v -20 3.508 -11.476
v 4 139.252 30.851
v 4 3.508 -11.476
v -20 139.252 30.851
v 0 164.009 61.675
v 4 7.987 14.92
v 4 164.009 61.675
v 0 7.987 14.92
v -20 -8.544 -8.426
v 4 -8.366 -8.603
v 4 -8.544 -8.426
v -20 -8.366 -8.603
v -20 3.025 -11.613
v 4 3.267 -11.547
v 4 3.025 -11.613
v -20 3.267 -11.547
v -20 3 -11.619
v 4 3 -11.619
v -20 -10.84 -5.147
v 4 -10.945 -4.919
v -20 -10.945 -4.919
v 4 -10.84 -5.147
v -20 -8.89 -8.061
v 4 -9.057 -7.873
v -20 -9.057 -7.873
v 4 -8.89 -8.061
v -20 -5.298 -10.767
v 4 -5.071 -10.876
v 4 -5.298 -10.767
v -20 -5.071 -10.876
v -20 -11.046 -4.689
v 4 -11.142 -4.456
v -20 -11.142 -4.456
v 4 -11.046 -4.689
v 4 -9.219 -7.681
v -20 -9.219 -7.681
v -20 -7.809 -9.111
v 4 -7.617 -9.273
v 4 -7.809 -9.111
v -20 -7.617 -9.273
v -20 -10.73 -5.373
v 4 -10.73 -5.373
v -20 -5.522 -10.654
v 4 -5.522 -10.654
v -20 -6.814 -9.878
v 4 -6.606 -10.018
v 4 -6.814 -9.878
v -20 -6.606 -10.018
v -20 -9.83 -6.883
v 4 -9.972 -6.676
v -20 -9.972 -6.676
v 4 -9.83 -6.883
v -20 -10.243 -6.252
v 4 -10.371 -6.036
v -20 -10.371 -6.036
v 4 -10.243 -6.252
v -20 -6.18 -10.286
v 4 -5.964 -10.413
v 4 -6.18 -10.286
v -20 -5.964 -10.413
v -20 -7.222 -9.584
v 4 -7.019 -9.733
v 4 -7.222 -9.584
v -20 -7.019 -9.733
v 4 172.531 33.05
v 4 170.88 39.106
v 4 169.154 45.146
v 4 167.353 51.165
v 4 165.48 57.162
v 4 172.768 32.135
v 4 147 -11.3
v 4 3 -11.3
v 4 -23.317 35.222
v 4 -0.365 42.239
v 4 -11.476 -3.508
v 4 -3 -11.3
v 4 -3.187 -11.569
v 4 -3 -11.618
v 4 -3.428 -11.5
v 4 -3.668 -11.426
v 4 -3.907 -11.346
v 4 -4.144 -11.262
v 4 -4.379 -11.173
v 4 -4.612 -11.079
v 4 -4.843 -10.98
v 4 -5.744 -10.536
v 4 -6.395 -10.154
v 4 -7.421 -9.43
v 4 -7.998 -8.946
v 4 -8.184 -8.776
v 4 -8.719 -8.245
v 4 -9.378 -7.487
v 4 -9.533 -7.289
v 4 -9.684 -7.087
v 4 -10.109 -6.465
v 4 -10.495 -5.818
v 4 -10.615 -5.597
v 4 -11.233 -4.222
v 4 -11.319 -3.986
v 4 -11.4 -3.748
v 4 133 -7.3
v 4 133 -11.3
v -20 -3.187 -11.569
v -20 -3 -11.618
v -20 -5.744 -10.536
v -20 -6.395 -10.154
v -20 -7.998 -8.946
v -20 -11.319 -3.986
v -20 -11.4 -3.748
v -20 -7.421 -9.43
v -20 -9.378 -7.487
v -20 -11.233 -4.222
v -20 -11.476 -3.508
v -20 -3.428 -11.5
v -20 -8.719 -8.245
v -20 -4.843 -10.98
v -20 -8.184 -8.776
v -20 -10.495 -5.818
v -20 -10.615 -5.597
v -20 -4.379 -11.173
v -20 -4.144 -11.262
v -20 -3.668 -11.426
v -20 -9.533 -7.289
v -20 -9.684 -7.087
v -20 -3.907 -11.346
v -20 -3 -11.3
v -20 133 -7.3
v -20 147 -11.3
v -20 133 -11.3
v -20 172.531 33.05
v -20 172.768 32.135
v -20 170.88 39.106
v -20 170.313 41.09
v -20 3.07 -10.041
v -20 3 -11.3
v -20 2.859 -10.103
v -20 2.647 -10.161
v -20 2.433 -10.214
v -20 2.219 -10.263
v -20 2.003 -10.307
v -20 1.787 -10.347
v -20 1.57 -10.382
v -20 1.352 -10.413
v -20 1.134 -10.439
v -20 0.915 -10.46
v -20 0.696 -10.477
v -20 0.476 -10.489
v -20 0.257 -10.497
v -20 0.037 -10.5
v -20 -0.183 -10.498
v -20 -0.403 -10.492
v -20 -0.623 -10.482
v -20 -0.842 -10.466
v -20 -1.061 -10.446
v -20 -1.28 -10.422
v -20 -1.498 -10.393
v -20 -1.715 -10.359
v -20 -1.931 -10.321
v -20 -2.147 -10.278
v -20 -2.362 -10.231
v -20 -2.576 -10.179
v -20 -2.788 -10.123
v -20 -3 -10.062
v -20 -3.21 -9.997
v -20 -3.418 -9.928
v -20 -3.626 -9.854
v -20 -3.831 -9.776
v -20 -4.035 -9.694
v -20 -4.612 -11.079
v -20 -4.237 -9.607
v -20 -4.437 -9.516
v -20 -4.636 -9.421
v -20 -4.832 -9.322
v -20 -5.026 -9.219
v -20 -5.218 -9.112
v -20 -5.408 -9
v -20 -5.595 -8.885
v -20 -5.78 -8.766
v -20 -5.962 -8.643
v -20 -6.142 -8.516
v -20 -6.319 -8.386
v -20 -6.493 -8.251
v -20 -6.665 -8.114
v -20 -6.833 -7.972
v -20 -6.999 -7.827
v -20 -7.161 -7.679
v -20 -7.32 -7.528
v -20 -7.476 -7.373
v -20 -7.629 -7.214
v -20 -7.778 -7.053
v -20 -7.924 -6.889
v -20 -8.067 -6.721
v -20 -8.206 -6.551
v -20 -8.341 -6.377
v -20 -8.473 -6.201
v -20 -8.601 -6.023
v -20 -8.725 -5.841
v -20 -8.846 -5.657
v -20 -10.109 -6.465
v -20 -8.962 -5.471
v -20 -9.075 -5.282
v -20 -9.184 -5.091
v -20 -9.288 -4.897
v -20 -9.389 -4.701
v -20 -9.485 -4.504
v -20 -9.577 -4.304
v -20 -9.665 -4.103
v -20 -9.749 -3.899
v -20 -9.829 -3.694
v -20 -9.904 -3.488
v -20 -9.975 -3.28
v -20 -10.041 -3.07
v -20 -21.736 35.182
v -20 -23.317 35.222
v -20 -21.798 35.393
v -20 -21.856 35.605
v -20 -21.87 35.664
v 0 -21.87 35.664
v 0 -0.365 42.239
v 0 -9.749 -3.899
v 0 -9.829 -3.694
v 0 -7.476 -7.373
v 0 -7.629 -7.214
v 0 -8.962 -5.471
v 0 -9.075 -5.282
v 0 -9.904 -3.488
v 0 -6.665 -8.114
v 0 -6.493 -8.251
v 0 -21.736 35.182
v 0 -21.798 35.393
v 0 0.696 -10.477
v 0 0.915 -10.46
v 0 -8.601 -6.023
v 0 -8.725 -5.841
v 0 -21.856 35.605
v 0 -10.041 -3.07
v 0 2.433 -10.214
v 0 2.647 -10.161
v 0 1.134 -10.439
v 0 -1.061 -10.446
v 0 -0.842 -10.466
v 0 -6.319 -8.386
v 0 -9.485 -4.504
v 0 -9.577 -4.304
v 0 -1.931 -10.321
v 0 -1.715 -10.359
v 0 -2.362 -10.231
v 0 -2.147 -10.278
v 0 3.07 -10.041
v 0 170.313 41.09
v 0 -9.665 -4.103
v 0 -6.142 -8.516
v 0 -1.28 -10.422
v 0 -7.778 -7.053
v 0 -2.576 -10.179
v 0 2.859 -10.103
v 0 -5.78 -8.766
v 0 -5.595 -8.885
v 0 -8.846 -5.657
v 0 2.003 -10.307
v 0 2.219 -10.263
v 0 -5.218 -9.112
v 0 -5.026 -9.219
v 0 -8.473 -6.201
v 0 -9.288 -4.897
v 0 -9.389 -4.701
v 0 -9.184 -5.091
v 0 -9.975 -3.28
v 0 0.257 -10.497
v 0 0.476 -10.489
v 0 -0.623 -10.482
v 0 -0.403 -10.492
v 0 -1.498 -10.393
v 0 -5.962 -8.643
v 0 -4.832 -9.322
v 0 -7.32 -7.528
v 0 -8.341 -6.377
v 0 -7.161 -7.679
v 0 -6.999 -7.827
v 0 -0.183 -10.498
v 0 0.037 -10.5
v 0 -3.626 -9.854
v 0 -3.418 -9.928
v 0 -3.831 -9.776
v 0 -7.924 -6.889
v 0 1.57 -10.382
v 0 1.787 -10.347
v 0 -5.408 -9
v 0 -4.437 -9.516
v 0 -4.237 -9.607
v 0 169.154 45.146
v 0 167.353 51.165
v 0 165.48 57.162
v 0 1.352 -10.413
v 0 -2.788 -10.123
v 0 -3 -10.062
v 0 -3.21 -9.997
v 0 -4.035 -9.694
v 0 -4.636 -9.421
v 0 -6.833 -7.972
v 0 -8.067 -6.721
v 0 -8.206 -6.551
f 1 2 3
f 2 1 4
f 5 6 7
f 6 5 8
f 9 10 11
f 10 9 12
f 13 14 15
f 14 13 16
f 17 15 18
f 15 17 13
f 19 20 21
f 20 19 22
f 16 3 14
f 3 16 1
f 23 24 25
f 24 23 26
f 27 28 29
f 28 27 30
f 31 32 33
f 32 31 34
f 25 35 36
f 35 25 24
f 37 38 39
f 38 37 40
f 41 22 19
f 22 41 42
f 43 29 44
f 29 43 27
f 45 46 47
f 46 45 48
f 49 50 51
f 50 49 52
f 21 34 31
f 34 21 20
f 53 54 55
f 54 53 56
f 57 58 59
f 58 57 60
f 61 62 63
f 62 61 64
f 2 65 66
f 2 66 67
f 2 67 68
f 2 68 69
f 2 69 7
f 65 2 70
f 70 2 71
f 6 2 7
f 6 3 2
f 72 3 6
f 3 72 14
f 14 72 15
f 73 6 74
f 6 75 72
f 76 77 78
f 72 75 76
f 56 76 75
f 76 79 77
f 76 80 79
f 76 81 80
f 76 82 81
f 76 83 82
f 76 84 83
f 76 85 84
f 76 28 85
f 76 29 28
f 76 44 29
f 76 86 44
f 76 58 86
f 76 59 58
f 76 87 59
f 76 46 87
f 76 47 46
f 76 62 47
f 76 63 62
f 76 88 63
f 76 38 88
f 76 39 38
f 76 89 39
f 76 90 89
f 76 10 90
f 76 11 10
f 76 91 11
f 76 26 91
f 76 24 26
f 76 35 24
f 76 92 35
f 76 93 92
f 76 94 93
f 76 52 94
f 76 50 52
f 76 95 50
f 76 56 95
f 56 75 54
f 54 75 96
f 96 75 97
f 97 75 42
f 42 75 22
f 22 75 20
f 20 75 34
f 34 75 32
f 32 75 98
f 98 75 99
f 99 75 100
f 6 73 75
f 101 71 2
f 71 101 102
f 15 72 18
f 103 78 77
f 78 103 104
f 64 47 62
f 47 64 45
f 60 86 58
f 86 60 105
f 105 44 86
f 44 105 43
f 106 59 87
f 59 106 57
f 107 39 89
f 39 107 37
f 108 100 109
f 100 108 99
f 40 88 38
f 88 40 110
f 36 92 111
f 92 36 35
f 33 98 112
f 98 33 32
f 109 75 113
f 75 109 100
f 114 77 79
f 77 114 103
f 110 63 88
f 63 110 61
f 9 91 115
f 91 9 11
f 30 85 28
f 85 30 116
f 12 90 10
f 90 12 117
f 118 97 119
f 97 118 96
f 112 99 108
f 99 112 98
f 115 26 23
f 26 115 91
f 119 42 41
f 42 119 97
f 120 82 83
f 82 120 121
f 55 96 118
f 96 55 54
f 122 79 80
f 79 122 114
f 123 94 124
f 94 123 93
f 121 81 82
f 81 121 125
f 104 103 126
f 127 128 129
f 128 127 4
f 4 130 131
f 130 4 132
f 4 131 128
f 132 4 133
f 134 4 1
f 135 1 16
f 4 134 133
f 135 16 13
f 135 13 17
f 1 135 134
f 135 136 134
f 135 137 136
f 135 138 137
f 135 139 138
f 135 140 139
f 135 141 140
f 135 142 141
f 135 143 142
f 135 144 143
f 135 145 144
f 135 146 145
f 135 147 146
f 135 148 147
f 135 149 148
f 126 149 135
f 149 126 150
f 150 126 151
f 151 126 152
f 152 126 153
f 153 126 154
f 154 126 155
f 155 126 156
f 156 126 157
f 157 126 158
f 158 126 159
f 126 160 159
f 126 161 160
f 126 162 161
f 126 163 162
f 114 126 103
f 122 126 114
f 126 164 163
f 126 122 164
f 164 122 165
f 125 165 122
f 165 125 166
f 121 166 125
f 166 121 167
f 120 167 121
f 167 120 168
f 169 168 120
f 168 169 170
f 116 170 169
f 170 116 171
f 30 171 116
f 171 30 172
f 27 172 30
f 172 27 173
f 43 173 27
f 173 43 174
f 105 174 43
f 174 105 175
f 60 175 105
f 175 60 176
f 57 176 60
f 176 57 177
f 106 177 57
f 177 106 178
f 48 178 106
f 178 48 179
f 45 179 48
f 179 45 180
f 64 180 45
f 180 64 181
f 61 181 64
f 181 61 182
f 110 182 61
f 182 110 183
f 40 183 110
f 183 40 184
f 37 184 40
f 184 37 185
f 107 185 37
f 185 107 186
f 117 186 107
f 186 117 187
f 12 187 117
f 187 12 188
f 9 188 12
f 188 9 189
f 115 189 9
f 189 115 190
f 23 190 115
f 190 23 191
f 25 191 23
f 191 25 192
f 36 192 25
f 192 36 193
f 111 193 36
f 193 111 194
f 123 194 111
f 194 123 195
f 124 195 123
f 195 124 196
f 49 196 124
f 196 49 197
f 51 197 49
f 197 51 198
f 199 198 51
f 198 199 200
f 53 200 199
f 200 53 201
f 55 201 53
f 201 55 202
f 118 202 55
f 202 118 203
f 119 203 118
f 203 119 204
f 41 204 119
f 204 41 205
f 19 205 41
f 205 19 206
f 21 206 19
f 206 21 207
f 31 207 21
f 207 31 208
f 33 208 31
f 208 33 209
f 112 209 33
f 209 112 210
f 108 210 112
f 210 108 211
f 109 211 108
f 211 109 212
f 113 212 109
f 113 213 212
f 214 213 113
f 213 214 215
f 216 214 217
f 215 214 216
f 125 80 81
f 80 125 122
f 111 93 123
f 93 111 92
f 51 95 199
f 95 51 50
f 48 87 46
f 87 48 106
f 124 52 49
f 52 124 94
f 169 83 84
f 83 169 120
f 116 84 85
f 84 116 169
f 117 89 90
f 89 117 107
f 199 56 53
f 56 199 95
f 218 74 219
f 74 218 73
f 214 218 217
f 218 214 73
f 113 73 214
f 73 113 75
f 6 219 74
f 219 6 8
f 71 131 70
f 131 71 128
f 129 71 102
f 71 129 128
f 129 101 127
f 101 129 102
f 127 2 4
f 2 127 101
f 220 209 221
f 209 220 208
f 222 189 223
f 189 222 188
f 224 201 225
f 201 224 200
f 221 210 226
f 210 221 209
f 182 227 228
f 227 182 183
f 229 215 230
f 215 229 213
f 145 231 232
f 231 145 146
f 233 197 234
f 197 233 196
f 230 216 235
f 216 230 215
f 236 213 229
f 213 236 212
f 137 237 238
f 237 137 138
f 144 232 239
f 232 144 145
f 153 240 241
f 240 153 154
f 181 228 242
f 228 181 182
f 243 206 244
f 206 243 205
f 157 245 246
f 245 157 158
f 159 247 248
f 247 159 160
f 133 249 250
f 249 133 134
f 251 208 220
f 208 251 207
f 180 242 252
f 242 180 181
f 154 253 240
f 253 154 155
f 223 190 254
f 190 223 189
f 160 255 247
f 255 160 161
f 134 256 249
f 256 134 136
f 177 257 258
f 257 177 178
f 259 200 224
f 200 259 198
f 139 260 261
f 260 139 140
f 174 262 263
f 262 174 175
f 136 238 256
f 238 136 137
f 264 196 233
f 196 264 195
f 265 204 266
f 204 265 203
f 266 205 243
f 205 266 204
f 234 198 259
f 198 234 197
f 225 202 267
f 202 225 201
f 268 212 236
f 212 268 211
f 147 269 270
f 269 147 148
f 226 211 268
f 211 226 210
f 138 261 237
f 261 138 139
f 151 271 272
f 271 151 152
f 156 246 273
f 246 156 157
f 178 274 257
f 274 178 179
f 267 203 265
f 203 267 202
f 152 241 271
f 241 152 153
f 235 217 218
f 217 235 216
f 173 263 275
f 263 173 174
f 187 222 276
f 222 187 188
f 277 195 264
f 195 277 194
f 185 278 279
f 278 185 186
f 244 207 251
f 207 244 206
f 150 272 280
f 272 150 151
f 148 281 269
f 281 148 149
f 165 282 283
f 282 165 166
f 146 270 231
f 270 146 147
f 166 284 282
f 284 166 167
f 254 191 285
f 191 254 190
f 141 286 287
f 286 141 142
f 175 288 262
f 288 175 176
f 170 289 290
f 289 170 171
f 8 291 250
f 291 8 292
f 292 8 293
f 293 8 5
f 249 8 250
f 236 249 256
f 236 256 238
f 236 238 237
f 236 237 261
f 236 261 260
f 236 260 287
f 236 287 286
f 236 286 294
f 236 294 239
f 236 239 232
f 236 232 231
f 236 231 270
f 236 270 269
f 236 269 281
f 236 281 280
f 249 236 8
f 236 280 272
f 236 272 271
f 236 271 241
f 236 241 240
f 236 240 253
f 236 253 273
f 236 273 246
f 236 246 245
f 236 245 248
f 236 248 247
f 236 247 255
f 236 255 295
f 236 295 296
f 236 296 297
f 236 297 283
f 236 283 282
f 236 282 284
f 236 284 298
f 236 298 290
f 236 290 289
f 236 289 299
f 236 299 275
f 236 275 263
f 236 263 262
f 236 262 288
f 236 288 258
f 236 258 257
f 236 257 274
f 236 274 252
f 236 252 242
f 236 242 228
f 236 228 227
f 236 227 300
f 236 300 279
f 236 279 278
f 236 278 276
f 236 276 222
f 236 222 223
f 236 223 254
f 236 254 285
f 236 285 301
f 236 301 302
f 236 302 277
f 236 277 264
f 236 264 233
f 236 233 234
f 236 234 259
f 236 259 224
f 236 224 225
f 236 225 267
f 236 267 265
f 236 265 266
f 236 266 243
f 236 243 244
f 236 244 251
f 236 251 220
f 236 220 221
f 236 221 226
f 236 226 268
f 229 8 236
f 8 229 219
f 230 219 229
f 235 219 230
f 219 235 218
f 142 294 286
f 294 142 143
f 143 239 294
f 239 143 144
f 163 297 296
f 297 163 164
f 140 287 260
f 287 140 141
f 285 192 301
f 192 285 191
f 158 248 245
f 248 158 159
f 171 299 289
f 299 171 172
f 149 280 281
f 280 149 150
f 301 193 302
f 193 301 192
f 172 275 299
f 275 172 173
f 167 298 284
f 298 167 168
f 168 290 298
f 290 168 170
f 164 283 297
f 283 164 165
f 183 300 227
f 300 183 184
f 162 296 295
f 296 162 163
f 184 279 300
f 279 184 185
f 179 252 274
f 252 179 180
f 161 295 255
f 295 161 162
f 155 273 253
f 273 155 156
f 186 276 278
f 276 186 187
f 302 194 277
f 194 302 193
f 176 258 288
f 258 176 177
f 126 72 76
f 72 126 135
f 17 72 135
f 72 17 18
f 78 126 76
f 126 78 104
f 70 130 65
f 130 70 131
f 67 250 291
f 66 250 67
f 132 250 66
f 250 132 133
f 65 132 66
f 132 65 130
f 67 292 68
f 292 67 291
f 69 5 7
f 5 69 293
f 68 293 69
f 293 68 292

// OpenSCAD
$fn=100;
a=17;

if($preview){
    translate([-380,0,0])rotate([0,0,-10])mirror([1,0,0])assy();
    translate([380,0,0])rotate([0,0,10])mirror([0,0,0])assy();
}else{
    $fn=300;
    mirror([0,0,0])stand(a);
}

// generate a single stand, mirror to generate the other half
// a = monitor-angle; r = monitor edge radius
module stand(a=0, r=11){
    d=r*2;
    intersection(){
        difference(){
            union(){
                // front-facing arm
                rotate([a,0,0])hull(){
                    rotate([0,90,0])translate([0,0,-20])cylinder(d=d+2,h=24);
                    rotate([0,90,0])translate([0,180,-20])cylinder(d=d,h=24);
                }
                // up-facing arm
                rotate([a,0,0])hull(){
                    rotate([0,90,0])translate([0,0,-20])cylinder(d=d+2,h=24);
                    rotate([0,90,0])translate([-30,0,-20+24/2])cube([21,d+2,24],center=true);
                }
                // foot
                hull(){
                    rotate([a,0,0])rotate([0,90,0])translate([0,180,-20])cylinder(d=d,h=24);
                    rotate([a,0,0])rotate([0,90,0])translate([0,160,-20])cylinder(d=d,h=24);
                    rotate([0,90,0])translate([-2+24/2-0.7,140,-24/2+4])cube([4,14,24],center=true);
                }
            }union(){
                // rest
                rotate([a,0,0])hull(){
                    rotate([0,90,0])translate([0,0,-20])cylinder(d=d-1,h=20);
                    rotate([0,90,0])translate([0,180,-20])cylinder(d=d-1,h=20);
                    rotate([0,90,0])translate([-40,0,-20])cylinder(d=d-1,h=20);
                }
                // foot
                translate([-10,0,-24/2])cube([40,6,1.4],center=true);
            }
        }
        union(){
            // funky stylistic cutoff for the stand, add a # infront to see what it does :3 
            rotate([a,0,0])rotate([0,90,0])translate([-0,-0,-25])scale([6,3.5,1])cylinder(d=100,h=40);
        }
    }
}

/*--------------*/

// my assembly, nubert monitors
module assy(){
    rotate([0,90,0])rotate([0,0,a])translate([-196/2+10,196/2-10,0])monitor();
    translate([326/2,0,0])mirror([0,0,0])stand(a);
    translate([-326/2,0,0])mirror([1,0,0])stand(a);
    // these translations won't scale with the angle
    rotate([180,0,0])translate([326/2,-117,-220])mirror([0,0,0])stand(a);
    rotate([180,0,0])translate([-326/2,-117,-220])mirror([1,0,0])stand(a);
    translate([0,40,232])plate();
}

// top-plate, wood in my case
module plate(){
    color("Sienna")translate([0,0,10/2])cube([334,170,10],center=true);
}

// nubert-monitor
module monitor(){
    translate([0,0,-326/2])difference(){
        union(){
            color("grey")translate([0,0,326/2])minkowski(){
                cube([196-20,196-20,326-0.001],center=true);
                cylinder(d=20,h=0.001);
            }
            color("DimGray")for(i=[-3:2:3]){
                translate([12*i,196/2,30])rotate([-90,0,0])cylinder(d=14,h=20);
            }
                color("black")translate([0,196/2,140])rotate([-90,0,0])cylinder(d=150,h=2);
                color("black")translate([0,196/2,270])rotate([-90,0,0])cylinder(d=100,h=2);
        }union(){
        }
    }
}
